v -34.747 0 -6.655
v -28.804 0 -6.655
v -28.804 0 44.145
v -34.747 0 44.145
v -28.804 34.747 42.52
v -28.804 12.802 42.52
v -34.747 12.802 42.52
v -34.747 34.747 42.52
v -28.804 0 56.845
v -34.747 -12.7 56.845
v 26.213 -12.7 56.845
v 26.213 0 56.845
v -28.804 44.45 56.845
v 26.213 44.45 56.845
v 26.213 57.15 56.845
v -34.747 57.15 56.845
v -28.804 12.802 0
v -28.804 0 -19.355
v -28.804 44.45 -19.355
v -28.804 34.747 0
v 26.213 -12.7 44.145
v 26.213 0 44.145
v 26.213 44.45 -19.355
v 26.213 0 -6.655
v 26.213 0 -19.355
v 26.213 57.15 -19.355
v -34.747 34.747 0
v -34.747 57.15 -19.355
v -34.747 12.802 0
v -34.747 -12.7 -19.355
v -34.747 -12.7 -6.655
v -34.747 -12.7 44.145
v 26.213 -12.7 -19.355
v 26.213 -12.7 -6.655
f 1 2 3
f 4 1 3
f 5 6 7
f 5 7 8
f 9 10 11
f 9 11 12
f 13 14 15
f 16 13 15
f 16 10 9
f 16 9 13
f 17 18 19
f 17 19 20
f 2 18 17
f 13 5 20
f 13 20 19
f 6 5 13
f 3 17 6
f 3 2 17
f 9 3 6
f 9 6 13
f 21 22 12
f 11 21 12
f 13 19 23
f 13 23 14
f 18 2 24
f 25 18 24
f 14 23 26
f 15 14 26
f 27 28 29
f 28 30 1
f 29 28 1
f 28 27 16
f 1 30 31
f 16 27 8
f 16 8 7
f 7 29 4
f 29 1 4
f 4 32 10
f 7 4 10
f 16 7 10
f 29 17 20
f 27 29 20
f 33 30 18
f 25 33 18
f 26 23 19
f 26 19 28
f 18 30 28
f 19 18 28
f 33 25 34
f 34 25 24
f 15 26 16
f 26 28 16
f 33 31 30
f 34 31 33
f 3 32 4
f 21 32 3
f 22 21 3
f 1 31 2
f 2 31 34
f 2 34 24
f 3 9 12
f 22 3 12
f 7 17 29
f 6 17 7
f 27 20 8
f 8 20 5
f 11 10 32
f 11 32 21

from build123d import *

# Parameters (mm, degrees)
F0_W     = 60.96
F0_H     = 76.2
F1_DEPTH = 12.7
F2_W     = 5.9436
F2_H     = 76.2
F3_DEPTH = 57.15
F4_W     = 12.7
F4_H     = 76.2
F5_DEPTH = 55.0164
F6_W     = 12.7
F6_H     = 50.8
F7_DEPTH = 63.5
F8_W     = 21.945603
F8_H     = 42.519599
F9_DEPTH = 25.4


with BuildPart() as f1:
    # F0 (on Front) → F1 (new body)
    with BuildSketch(Plane.XZ):
        with Locations((-4.267202, 18.7452)):
            Rectangle(F0_W, F0_H)
    extrude(amount=F1_DEPTH)

    # F2 (on face) → F3 (join)
    with BuildSketch(Plane(origin=(0, 0, 0), x_dir=(-1, 0, 0), z_dir=(0, 1, 0))):
        with Locations((31.775402, 18.7452)):
            Rectangle(F2_W, F2_H)
    extrude(amount=F3_DEPTH)

    # F4 (on face) → F5 (join)
    with BuildSketch(Plane.YZ.offset(-28.803602)):
        with Locations((50.8, 18.7452)):
            Rectangle(F4_W, F4_H)
    extrude(amount=F5_DEPTH)

    # F6 (on face) → F7 (cut)
    with BuildSketch(Plane.YZ.offset(26.212798)):
        with Locations((-6.35, 18.7452)):
            Rectangle(F6_W, F6_H)
    extrude(amount=-F7_DEPTH, mode=Mode.SUBTRACT)

    # F8 (on face) → F9 (cut)
    with BuildSketch(Plane.YZ.offset(-28.803602)):
        with Locations((23.7744, 21.259799)):
            Rectangle(F8_W, F8_H)
    extrude(amount=-F9_DEPTH, mode=Mode.SUBTRACT)


solid = f1.part
